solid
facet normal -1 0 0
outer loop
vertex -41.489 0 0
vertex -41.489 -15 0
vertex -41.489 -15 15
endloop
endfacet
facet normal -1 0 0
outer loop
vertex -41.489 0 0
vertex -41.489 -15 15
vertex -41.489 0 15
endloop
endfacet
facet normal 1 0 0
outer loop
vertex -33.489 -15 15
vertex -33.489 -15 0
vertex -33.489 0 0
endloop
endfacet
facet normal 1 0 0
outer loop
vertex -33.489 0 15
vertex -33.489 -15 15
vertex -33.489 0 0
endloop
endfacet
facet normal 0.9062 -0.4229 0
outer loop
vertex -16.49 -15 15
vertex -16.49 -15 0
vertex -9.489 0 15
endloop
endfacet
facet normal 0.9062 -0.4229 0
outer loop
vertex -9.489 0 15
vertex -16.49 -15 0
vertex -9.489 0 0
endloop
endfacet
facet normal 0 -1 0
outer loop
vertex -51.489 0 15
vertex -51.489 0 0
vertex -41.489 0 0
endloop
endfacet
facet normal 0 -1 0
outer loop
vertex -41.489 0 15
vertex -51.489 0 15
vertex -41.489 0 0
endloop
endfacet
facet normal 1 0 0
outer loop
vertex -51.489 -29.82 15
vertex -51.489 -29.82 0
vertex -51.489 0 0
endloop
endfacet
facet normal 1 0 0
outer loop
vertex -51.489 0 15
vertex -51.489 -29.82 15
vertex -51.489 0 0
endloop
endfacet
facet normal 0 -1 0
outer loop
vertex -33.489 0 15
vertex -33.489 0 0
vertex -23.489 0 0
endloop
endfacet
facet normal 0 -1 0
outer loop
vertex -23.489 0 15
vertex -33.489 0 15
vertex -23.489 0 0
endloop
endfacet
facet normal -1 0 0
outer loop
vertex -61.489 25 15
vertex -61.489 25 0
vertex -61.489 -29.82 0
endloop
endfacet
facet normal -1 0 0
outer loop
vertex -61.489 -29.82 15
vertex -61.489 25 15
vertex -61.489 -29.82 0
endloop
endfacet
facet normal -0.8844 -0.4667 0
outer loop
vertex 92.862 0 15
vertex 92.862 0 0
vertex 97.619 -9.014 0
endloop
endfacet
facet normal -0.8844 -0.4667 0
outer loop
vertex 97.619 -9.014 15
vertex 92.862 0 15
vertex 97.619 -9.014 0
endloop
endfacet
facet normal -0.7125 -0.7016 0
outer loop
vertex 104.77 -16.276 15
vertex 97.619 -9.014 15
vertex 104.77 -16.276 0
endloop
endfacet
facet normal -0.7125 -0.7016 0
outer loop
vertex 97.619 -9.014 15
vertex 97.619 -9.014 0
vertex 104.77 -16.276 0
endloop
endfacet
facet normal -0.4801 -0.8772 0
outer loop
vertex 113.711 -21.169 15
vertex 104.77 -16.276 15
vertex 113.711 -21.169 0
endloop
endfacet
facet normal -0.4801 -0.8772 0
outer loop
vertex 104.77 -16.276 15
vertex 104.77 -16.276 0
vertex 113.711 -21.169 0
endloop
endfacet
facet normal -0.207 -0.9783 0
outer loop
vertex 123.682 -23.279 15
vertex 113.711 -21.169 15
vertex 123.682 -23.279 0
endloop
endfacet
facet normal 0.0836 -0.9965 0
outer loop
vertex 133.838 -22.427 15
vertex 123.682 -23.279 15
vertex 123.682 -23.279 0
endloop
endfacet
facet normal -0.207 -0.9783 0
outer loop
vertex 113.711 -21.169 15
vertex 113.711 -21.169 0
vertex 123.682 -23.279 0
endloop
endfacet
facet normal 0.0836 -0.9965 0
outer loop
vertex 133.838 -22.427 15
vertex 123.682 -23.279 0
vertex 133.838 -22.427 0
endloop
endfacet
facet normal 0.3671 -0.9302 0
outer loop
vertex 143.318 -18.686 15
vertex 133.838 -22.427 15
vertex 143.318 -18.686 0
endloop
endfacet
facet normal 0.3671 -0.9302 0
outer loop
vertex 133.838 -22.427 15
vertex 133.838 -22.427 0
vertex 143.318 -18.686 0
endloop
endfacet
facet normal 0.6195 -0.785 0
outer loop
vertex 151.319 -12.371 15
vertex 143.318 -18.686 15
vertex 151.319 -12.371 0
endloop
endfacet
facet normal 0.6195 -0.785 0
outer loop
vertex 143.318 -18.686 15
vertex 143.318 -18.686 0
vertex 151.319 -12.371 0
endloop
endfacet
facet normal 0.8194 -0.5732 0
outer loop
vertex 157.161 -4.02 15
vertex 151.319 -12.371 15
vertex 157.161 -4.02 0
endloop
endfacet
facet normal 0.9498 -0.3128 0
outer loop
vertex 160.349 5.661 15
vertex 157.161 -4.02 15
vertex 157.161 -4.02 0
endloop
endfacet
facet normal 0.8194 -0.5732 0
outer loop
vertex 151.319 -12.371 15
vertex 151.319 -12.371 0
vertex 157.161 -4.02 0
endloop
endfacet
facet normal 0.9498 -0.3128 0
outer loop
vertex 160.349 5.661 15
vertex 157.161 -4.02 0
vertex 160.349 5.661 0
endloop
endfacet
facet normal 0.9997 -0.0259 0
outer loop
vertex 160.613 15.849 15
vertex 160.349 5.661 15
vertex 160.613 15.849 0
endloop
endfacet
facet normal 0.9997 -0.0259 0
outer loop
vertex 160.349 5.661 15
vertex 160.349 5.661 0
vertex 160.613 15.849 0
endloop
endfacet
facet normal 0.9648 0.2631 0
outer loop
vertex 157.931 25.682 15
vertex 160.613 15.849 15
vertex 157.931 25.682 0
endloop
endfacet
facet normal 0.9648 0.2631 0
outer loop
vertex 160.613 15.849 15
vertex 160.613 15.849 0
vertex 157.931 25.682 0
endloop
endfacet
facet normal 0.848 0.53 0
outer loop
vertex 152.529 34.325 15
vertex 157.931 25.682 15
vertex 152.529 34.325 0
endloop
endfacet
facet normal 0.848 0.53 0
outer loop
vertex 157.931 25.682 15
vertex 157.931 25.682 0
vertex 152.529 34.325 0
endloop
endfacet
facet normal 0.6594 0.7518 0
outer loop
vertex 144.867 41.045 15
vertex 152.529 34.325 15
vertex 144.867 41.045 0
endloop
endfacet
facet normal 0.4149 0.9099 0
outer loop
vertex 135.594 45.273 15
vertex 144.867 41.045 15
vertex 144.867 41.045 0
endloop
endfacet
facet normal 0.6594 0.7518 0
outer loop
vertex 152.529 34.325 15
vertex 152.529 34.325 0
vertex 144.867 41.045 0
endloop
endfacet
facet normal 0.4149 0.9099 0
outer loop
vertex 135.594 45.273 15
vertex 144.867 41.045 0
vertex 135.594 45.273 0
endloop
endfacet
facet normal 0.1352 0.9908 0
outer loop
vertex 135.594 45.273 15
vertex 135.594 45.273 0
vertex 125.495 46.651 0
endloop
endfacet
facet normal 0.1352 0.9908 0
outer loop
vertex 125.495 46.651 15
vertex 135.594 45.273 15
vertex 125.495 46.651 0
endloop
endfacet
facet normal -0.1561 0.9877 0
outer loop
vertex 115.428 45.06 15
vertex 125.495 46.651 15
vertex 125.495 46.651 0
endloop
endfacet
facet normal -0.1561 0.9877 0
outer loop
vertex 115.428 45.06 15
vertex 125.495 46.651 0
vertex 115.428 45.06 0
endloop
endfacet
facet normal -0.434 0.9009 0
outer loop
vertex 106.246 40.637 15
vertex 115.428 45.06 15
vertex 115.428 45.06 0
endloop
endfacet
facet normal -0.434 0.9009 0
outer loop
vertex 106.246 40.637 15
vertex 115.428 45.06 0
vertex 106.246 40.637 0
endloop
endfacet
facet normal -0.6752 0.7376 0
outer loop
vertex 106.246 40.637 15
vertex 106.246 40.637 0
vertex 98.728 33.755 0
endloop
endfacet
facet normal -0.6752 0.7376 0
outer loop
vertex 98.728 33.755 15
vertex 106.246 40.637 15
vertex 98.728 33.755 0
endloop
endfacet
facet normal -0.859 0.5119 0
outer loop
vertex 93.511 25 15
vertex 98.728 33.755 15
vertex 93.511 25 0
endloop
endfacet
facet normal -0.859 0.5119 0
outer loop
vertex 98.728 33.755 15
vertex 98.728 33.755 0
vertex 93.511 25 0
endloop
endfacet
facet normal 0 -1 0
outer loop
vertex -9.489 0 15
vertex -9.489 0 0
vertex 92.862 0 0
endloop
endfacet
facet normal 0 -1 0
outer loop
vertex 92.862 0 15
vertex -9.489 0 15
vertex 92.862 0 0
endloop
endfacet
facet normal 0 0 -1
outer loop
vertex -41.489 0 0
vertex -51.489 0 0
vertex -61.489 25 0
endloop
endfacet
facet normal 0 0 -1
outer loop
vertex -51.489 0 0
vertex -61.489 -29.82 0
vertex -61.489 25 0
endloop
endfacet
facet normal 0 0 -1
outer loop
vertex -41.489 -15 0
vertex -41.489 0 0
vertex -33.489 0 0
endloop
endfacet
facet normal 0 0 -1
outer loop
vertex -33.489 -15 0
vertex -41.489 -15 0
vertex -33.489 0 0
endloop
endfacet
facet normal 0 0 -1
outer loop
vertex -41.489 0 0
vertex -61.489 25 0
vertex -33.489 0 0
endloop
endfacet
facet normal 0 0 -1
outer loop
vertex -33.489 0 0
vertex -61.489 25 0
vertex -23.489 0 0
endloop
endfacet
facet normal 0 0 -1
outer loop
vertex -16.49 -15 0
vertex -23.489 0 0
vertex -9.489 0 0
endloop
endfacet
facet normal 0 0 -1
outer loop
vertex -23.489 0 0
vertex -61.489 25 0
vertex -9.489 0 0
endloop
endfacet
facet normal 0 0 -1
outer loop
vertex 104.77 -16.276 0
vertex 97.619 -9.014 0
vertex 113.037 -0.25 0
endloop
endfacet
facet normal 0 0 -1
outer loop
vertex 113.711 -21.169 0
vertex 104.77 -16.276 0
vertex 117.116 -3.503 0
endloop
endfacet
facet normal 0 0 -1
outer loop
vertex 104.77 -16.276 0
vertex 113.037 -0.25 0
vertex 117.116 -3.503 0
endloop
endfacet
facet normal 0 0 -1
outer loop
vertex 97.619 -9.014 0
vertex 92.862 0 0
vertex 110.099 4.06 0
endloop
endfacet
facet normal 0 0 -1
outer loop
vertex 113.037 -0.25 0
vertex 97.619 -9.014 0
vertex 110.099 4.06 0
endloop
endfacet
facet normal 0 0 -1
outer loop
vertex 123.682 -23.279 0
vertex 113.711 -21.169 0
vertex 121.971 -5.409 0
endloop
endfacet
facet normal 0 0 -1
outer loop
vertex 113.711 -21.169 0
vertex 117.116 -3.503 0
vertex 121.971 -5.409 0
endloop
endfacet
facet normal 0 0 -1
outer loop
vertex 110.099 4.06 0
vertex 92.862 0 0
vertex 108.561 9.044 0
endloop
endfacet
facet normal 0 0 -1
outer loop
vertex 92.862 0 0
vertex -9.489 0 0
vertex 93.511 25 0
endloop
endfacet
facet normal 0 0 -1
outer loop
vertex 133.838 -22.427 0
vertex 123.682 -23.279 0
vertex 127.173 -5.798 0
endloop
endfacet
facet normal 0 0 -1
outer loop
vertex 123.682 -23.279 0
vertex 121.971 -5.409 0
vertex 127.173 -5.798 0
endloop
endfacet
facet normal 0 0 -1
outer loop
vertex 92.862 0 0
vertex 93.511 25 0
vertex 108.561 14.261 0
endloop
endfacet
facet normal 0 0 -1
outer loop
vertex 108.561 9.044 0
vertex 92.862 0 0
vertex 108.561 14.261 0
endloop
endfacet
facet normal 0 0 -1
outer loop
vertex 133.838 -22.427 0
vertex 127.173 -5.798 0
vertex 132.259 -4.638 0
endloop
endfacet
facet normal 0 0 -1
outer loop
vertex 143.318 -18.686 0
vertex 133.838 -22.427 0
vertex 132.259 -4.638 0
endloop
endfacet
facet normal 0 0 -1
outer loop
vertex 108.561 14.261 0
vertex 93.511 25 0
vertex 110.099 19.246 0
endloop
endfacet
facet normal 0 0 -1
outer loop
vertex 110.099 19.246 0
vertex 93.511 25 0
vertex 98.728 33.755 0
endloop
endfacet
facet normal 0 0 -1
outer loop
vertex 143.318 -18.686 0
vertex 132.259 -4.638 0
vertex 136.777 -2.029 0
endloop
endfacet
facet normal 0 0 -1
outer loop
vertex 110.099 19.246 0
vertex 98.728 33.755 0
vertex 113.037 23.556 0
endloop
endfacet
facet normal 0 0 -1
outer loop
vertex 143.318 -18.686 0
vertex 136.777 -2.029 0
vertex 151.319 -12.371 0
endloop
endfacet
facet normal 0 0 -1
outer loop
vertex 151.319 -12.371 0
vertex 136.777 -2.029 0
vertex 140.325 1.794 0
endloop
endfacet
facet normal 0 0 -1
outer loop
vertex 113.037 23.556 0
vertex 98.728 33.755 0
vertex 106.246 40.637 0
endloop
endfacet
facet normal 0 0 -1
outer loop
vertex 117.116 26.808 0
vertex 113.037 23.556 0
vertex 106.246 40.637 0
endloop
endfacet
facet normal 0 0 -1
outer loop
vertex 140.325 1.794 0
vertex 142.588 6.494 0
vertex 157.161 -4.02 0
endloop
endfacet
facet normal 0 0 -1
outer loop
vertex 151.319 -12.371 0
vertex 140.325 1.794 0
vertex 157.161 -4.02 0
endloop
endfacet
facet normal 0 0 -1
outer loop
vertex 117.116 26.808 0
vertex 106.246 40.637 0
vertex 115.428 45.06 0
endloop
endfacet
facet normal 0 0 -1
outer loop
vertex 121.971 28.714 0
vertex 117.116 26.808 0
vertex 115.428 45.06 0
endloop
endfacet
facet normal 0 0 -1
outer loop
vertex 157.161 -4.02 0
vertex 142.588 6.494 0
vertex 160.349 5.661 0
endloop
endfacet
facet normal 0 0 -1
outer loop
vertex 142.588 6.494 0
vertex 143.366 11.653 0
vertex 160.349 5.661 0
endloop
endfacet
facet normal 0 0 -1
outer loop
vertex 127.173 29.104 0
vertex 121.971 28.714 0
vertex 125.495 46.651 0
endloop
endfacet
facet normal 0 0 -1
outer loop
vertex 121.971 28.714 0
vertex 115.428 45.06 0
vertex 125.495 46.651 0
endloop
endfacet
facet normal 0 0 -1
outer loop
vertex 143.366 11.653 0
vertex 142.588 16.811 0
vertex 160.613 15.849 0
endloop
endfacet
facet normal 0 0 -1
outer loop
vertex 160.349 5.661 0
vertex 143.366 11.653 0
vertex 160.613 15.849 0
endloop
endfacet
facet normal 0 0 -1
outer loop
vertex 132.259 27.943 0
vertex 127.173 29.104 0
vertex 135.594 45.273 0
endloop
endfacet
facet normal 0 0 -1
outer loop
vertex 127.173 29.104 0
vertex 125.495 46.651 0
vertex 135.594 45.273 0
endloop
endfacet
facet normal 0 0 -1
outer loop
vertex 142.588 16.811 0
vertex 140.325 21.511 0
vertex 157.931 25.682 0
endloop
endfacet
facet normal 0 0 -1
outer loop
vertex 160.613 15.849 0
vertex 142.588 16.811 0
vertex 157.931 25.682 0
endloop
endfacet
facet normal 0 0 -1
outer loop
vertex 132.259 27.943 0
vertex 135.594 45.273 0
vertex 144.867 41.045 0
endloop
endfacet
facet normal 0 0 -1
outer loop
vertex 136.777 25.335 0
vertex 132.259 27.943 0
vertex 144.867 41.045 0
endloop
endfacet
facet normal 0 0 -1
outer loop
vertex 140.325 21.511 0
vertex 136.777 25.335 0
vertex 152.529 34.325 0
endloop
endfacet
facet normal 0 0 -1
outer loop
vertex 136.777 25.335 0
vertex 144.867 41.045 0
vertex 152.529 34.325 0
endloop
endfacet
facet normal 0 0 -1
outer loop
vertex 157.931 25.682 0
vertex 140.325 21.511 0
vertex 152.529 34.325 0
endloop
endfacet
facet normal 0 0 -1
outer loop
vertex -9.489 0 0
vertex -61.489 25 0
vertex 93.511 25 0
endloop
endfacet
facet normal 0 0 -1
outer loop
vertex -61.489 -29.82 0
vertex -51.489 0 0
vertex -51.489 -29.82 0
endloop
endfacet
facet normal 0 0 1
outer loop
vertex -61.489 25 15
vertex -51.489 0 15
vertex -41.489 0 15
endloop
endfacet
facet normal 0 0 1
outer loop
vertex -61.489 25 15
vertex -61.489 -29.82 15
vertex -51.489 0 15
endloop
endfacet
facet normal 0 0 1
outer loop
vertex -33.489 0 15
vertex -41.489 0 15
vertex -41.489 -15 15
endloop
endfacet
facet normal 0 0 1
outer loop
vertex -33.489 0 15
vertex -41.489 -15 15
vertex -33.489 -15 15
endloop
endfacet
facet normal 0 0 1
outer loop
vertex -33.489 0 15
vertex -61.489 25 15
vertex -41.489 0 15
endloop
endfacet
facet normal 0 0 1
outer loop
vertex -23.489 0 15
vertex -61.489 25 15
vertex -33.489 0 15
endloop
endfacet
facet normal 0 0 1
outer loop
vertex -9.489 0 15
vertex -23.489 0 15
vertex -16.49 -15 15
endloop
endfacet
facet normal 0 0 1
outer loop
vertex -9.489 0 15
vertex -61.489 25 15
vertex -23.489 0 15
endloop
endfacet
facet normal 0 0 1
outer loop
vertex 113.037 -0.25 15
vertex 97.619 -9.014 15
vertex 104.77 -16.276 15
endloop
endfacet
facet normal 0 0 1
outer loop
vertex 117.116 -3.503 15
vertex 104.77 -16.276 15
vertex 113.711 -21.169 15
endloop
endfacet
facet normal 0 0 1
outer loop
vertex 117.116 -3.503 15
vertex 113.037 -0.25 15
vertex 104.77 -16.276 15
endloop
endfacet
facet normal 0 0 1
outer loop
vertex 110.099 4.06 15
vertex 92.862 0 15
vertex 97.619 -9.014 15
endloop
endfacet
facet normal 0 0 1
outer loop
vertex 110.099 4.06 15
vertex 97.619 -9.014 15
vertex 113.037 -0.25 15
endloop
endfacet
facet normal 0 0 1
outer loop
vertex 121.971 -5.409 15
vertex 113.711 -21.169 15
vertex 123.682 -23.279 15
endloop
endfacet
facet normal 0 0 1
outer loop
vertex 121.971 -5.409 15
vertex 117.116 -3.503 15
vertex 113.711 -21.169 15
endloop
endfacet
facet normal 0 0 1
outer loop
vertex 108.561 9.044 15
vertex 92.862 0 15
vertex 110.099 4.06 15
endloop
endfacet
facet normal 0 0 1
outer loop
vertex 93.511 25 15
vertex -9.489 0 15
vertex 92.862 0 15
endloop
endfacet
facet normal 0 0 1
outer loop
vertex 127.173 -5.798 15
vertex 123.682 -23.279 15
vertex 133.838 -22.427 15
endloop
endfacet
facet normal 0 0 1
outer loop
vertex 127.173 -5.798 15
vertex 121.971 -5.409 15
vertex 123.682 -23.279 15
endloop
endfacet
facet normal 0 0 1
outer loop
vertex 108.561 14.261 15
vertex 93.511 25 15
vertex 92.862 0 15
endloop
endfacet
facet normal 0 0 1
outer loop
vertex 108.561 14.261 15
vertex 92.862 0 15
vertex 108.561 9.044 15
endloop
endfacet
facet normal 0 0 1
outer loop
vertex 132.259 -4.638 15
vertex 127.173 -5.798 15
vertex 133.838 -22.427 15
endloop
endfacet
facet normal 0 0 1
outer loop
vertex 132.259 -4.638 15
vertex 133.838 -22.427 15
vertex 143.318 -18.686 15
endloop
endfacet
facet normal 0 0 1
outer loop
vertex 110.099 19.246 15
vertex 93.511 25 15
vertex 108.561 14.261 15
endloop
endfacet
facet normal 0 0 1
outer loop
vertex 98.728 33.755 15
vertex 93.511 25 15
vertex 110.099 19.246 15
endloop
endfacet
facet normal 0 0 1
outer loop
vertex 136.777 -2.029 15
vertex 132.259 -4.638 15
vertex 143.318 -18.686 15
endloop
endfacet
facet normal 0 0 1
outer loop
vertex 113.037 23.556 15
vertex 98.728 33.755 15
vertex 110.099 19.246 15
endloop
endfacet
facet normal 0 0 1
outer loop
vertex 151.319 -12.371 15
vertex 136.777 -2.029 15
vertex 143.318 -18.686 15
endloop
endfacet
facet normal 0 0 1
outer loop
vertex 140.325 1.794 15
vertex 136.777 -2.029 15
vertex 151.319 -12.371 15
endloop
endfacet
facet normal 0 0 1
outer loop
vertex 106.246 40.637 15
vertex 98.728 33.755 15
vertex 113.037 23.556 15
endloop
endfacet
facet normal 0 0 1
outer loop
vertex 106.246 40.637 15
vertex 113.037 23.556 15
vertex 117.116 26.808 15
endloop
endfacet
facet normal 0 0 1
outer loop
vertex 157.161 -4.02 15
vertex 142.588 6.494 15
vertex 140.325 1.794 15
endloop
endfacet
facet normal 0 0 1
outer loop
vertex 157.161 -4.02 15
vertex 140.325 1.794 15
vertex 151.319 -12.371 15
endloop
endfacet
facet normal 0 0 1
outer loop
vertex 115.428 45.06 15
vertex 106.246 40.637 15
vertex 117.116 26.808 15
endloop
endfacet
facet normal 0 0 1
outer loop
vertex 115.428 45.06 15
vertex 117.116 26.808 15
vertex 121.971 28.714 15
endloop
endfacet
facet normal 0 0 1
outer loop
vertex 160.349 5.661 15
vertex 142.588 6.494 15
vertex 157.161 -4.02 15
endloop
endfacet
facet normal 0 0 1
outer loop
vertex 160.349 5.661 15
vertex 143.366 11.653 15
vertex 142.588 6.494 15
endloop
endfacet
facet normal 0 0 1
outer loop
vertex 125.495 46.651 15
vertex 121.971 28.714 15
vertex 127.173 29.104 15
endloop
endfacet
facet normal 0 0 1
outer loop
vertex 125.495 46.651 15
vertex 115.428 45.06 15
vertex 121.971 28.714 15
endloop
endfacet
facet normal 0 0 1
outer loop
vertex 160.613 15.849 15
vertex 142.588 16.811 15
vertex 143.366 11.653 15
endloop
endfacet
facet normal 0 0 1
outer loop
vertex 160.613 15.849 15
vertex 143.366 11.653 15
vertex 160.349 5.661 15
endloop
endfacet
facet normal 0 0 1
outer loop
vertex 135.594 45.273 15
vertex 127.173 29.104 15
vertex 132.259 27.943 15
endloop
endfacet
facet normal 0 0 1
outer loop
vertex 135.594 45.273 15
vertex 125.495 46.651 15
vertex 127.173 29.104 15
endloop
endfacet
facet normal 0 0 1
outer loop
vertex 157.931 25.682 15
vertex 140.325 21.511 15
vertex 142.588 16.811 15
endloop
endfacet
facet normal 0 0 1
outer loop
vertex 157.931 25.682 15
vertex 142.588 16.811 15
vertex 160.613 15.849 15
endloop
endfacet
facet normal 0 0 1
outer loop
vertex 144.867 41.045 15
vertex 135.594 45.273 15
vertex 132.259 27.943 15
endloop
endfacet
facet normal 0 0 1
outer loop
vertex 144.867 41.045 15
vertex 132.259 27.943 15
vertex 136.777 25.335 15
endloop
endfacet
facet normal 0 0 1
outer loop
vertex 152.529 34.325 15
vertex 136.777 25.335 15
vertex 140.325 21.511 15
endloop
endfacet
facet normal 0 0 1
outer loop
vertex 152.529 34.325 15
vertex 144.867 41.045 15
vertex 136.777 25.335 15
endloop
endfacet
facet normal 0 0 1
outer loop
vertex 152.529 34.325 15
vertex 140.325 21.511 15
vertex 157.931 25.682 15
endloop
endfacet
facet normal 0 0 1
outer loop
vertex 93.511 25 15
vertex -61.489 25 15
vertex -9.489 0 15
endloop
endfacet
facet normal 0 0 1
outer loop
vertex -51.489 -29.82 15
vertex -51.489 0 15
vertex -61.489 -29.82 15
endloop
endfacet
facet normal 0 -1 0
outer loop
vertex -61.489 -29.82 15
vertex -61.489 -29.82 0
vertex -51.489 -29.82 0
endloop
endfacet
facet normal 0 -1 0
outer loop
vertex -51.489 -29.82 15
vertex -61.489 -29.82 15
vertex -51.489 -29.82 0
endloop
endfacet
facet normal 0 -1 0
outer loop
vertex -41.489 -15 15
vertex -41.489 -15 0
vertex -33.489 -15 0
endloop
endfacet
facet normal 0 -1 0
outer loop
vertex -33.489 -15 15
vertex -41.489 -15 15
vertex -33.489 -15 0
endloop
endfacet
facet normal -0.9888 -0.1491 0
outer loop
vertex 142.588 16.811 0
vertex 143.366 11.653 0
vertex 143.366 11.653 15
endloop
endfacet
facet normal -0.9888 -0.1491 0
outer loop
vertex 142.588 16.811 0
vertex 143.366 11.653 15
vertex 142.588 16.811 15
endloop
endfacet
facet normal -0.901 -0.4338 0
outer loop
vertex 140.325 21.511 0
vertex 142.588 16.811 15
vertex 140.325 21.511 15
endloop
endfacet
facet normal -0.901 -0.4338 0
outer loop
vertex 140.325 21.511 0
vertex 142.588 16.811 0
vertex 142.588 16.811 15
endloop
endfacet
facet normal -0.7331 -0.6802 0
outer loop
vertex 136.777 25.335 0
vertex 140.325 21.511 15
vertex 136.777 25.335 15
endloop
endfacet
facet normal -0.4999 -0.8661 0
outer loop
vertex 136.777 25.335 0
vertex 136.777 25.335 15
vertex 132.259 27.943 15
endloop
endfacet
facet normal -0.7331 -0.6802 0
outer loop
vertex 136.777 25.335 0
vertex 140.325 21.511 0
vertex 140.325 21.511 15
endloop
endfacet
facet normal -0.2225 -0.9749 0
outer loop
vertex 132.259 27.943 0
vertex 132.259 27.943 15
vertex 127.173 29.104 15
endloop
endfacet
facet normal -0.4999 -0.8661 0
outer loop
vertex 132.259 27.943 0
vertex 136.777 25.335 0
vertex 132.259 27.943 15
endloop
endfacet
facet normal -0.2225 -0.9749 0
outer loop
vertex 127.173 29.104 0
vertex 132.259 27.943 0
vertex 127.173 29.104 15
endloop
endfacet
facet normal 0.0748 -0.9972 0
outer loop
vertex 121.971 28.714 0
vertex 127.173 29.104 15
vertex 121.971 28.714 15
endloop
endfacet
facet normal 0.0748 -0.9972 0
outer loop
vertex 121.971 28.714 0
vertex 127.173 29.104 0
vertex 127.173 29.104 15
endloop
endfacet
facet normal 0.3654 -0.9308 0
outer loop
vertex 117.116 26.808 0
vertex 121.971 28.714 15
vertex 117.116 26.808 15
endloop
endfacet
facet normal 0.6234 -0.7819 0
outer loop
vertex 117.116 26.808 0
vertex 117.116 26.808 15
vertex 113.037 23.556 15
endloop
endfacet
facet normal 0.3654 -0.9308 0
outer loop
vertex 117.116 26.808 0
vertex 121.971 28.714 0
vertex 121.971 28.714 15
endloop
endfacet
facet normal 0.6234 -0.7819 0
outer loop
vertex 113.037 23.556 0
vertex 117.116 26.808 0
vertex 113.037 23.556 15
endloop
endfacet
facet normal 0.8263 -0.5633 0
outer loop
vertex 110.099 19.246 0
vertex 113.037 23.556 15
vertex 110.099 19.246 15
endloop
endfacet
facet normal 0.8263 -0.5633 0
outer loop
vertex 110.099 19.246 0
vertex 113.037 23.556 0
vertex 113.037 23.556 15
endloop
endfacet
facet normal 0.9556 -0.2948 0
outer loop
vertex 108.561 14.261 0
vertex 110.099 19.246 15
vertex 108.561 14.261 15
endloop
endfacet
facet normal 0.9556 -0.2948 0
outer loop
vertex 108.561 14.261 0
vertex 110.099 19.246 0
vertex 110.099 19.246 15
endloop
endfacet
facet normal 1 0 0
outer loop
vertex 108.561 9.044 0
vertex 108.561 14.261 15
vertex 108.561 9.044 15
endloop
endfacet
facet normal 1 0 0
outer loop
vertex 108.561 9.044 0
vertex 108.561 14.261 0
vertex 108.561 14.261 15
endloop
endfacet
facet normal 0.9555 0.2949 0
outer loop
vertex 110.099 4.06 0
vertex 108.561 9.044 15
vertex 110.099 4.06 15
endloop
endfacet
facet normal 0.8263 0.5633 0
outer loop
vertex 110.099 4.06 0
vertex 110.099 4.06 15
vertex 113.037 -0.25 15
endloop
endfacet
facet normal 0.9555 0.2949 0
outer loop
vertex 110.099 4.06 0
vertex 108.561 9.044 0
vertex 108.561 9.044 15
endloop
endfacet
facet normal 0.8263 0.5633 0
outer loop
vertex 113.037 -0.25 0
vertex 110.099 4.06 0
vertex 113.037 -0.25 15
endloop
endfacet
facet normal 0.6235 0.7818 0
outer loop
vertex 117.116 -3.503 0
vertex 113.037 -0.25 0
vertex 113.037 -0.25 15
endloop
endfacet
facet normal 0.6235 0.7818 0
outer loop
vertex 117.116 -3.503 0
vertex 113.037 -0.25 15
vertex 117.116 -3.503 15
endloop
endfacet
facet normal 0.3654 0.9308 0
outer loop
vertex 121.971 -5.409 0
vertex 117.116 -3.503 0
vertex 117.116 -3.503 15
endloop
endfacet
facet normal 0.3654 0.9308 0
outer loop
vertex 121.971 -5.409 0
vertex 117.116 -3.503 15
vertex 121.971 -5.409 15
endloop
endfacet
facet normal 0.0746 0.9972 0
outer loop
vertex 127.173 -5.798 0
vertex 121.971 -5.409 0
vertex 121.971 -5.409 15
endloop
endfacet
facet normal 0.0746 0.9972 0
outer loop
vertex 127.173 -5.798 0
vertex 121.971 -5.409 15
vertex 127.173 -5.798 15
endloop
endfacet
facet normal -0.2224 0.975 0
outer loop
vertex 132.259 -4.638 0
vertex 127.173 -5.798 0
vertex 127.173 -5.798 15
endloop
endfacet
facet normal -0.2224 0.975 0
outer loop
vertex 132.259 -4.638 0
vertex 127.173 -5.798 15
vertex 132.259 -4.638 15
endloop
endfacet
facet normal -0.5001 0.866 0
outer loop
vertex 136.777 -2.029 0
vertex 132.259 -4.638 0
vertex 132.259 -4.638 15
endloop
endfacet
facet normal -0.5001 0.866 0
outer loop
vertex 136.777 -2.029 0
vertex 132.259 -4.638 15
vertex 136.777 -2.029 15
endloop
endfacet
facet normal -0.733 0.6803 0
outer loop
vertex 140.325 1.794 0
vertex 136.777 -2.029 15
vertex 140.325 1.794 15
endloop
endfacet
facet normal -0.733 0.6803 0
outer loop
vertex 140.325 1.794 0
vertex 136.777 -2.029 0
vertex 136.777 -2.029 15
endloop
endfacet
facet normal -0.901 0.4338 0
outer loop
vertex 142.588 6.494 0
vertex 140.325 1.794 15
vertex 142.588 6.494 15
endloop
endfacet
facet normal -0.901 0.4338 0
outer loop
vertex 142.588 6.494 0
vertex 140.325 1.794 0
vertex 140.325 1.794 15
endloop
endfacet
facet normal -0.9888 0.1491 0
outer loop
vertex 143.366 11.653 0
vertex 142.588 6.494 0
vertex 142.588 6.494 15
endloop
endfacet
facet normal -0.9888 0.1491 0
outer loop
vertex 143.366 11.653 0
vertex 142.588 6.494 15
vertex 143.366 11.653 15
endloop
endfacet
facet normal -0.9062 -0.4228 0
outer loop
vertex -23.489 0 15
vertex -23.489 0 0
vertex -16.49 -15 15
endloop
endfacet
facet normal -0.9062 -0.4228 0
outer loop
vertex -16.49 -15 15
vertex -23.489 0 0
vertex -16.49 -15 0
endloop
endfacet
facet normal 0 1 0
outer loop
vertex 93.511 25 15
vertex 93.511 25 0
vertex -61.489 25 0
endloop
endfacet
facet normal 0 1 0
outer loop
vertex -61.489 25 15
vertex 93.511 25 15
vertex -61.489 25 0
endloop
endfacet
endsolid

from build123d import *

# Parameters (mm, degrees)
F0_R     = 17.5
F0_W     = 10
F0_H     = 0.180238
F0_H_2   = 29.819762
F0_W_2   = 8
F0_H_3   = 15
F1_DEPTH = 15


with BuildPart() as f1:
    # F0 (on Top) → F1 (new body)
    with BuildSketch(Plane.XY):
        with BuildLine():
            Line((93.510551, 25), (-61.489449, 25))
            Line((-61.489449, 25), (-61.489449, 0.180238))
            Line((-61.489449, 0.180238), (-51.489449, 0.180238))
            Line((-51.489449, 0.180238), (-51.489449, 0))
            Line((-51.489449, 0), (-41.489449, 0))
            Line((-41.489449, 0), (-33.489449, 0))
            Line((-33.489449, 0), (-23.489449, 0))
            Line((-23.489449, 0), (-9.489449, 0))
            Line((-9.489449, 0), (92.862259, 0))
            ThreePointArc((92.862259, 0), (160.853792, 10.745271), (93.510551, 25))
        make_face()
        with Locations((125.865554, 11.652575)):
            Circle(F0_R, mode=Mode.SUBTRACT)
        with Locations((-56.489449, 0.090119)):
            Rectangle(F0_W, F0_H)
        with Locations((-56.489449, -14.909881)):
            Rectangle(F0_W, F0_H_2)
        Polygon((-16.489578, -15), (-9.489449, 0), (-23.489449, 0), align=None)
        with Locations((-37.489449, -7.5)):
            Rectangle(F0_W_2, F0_H_3)
    extrude(amount=F1_DEPTH)


solid = f1.part
